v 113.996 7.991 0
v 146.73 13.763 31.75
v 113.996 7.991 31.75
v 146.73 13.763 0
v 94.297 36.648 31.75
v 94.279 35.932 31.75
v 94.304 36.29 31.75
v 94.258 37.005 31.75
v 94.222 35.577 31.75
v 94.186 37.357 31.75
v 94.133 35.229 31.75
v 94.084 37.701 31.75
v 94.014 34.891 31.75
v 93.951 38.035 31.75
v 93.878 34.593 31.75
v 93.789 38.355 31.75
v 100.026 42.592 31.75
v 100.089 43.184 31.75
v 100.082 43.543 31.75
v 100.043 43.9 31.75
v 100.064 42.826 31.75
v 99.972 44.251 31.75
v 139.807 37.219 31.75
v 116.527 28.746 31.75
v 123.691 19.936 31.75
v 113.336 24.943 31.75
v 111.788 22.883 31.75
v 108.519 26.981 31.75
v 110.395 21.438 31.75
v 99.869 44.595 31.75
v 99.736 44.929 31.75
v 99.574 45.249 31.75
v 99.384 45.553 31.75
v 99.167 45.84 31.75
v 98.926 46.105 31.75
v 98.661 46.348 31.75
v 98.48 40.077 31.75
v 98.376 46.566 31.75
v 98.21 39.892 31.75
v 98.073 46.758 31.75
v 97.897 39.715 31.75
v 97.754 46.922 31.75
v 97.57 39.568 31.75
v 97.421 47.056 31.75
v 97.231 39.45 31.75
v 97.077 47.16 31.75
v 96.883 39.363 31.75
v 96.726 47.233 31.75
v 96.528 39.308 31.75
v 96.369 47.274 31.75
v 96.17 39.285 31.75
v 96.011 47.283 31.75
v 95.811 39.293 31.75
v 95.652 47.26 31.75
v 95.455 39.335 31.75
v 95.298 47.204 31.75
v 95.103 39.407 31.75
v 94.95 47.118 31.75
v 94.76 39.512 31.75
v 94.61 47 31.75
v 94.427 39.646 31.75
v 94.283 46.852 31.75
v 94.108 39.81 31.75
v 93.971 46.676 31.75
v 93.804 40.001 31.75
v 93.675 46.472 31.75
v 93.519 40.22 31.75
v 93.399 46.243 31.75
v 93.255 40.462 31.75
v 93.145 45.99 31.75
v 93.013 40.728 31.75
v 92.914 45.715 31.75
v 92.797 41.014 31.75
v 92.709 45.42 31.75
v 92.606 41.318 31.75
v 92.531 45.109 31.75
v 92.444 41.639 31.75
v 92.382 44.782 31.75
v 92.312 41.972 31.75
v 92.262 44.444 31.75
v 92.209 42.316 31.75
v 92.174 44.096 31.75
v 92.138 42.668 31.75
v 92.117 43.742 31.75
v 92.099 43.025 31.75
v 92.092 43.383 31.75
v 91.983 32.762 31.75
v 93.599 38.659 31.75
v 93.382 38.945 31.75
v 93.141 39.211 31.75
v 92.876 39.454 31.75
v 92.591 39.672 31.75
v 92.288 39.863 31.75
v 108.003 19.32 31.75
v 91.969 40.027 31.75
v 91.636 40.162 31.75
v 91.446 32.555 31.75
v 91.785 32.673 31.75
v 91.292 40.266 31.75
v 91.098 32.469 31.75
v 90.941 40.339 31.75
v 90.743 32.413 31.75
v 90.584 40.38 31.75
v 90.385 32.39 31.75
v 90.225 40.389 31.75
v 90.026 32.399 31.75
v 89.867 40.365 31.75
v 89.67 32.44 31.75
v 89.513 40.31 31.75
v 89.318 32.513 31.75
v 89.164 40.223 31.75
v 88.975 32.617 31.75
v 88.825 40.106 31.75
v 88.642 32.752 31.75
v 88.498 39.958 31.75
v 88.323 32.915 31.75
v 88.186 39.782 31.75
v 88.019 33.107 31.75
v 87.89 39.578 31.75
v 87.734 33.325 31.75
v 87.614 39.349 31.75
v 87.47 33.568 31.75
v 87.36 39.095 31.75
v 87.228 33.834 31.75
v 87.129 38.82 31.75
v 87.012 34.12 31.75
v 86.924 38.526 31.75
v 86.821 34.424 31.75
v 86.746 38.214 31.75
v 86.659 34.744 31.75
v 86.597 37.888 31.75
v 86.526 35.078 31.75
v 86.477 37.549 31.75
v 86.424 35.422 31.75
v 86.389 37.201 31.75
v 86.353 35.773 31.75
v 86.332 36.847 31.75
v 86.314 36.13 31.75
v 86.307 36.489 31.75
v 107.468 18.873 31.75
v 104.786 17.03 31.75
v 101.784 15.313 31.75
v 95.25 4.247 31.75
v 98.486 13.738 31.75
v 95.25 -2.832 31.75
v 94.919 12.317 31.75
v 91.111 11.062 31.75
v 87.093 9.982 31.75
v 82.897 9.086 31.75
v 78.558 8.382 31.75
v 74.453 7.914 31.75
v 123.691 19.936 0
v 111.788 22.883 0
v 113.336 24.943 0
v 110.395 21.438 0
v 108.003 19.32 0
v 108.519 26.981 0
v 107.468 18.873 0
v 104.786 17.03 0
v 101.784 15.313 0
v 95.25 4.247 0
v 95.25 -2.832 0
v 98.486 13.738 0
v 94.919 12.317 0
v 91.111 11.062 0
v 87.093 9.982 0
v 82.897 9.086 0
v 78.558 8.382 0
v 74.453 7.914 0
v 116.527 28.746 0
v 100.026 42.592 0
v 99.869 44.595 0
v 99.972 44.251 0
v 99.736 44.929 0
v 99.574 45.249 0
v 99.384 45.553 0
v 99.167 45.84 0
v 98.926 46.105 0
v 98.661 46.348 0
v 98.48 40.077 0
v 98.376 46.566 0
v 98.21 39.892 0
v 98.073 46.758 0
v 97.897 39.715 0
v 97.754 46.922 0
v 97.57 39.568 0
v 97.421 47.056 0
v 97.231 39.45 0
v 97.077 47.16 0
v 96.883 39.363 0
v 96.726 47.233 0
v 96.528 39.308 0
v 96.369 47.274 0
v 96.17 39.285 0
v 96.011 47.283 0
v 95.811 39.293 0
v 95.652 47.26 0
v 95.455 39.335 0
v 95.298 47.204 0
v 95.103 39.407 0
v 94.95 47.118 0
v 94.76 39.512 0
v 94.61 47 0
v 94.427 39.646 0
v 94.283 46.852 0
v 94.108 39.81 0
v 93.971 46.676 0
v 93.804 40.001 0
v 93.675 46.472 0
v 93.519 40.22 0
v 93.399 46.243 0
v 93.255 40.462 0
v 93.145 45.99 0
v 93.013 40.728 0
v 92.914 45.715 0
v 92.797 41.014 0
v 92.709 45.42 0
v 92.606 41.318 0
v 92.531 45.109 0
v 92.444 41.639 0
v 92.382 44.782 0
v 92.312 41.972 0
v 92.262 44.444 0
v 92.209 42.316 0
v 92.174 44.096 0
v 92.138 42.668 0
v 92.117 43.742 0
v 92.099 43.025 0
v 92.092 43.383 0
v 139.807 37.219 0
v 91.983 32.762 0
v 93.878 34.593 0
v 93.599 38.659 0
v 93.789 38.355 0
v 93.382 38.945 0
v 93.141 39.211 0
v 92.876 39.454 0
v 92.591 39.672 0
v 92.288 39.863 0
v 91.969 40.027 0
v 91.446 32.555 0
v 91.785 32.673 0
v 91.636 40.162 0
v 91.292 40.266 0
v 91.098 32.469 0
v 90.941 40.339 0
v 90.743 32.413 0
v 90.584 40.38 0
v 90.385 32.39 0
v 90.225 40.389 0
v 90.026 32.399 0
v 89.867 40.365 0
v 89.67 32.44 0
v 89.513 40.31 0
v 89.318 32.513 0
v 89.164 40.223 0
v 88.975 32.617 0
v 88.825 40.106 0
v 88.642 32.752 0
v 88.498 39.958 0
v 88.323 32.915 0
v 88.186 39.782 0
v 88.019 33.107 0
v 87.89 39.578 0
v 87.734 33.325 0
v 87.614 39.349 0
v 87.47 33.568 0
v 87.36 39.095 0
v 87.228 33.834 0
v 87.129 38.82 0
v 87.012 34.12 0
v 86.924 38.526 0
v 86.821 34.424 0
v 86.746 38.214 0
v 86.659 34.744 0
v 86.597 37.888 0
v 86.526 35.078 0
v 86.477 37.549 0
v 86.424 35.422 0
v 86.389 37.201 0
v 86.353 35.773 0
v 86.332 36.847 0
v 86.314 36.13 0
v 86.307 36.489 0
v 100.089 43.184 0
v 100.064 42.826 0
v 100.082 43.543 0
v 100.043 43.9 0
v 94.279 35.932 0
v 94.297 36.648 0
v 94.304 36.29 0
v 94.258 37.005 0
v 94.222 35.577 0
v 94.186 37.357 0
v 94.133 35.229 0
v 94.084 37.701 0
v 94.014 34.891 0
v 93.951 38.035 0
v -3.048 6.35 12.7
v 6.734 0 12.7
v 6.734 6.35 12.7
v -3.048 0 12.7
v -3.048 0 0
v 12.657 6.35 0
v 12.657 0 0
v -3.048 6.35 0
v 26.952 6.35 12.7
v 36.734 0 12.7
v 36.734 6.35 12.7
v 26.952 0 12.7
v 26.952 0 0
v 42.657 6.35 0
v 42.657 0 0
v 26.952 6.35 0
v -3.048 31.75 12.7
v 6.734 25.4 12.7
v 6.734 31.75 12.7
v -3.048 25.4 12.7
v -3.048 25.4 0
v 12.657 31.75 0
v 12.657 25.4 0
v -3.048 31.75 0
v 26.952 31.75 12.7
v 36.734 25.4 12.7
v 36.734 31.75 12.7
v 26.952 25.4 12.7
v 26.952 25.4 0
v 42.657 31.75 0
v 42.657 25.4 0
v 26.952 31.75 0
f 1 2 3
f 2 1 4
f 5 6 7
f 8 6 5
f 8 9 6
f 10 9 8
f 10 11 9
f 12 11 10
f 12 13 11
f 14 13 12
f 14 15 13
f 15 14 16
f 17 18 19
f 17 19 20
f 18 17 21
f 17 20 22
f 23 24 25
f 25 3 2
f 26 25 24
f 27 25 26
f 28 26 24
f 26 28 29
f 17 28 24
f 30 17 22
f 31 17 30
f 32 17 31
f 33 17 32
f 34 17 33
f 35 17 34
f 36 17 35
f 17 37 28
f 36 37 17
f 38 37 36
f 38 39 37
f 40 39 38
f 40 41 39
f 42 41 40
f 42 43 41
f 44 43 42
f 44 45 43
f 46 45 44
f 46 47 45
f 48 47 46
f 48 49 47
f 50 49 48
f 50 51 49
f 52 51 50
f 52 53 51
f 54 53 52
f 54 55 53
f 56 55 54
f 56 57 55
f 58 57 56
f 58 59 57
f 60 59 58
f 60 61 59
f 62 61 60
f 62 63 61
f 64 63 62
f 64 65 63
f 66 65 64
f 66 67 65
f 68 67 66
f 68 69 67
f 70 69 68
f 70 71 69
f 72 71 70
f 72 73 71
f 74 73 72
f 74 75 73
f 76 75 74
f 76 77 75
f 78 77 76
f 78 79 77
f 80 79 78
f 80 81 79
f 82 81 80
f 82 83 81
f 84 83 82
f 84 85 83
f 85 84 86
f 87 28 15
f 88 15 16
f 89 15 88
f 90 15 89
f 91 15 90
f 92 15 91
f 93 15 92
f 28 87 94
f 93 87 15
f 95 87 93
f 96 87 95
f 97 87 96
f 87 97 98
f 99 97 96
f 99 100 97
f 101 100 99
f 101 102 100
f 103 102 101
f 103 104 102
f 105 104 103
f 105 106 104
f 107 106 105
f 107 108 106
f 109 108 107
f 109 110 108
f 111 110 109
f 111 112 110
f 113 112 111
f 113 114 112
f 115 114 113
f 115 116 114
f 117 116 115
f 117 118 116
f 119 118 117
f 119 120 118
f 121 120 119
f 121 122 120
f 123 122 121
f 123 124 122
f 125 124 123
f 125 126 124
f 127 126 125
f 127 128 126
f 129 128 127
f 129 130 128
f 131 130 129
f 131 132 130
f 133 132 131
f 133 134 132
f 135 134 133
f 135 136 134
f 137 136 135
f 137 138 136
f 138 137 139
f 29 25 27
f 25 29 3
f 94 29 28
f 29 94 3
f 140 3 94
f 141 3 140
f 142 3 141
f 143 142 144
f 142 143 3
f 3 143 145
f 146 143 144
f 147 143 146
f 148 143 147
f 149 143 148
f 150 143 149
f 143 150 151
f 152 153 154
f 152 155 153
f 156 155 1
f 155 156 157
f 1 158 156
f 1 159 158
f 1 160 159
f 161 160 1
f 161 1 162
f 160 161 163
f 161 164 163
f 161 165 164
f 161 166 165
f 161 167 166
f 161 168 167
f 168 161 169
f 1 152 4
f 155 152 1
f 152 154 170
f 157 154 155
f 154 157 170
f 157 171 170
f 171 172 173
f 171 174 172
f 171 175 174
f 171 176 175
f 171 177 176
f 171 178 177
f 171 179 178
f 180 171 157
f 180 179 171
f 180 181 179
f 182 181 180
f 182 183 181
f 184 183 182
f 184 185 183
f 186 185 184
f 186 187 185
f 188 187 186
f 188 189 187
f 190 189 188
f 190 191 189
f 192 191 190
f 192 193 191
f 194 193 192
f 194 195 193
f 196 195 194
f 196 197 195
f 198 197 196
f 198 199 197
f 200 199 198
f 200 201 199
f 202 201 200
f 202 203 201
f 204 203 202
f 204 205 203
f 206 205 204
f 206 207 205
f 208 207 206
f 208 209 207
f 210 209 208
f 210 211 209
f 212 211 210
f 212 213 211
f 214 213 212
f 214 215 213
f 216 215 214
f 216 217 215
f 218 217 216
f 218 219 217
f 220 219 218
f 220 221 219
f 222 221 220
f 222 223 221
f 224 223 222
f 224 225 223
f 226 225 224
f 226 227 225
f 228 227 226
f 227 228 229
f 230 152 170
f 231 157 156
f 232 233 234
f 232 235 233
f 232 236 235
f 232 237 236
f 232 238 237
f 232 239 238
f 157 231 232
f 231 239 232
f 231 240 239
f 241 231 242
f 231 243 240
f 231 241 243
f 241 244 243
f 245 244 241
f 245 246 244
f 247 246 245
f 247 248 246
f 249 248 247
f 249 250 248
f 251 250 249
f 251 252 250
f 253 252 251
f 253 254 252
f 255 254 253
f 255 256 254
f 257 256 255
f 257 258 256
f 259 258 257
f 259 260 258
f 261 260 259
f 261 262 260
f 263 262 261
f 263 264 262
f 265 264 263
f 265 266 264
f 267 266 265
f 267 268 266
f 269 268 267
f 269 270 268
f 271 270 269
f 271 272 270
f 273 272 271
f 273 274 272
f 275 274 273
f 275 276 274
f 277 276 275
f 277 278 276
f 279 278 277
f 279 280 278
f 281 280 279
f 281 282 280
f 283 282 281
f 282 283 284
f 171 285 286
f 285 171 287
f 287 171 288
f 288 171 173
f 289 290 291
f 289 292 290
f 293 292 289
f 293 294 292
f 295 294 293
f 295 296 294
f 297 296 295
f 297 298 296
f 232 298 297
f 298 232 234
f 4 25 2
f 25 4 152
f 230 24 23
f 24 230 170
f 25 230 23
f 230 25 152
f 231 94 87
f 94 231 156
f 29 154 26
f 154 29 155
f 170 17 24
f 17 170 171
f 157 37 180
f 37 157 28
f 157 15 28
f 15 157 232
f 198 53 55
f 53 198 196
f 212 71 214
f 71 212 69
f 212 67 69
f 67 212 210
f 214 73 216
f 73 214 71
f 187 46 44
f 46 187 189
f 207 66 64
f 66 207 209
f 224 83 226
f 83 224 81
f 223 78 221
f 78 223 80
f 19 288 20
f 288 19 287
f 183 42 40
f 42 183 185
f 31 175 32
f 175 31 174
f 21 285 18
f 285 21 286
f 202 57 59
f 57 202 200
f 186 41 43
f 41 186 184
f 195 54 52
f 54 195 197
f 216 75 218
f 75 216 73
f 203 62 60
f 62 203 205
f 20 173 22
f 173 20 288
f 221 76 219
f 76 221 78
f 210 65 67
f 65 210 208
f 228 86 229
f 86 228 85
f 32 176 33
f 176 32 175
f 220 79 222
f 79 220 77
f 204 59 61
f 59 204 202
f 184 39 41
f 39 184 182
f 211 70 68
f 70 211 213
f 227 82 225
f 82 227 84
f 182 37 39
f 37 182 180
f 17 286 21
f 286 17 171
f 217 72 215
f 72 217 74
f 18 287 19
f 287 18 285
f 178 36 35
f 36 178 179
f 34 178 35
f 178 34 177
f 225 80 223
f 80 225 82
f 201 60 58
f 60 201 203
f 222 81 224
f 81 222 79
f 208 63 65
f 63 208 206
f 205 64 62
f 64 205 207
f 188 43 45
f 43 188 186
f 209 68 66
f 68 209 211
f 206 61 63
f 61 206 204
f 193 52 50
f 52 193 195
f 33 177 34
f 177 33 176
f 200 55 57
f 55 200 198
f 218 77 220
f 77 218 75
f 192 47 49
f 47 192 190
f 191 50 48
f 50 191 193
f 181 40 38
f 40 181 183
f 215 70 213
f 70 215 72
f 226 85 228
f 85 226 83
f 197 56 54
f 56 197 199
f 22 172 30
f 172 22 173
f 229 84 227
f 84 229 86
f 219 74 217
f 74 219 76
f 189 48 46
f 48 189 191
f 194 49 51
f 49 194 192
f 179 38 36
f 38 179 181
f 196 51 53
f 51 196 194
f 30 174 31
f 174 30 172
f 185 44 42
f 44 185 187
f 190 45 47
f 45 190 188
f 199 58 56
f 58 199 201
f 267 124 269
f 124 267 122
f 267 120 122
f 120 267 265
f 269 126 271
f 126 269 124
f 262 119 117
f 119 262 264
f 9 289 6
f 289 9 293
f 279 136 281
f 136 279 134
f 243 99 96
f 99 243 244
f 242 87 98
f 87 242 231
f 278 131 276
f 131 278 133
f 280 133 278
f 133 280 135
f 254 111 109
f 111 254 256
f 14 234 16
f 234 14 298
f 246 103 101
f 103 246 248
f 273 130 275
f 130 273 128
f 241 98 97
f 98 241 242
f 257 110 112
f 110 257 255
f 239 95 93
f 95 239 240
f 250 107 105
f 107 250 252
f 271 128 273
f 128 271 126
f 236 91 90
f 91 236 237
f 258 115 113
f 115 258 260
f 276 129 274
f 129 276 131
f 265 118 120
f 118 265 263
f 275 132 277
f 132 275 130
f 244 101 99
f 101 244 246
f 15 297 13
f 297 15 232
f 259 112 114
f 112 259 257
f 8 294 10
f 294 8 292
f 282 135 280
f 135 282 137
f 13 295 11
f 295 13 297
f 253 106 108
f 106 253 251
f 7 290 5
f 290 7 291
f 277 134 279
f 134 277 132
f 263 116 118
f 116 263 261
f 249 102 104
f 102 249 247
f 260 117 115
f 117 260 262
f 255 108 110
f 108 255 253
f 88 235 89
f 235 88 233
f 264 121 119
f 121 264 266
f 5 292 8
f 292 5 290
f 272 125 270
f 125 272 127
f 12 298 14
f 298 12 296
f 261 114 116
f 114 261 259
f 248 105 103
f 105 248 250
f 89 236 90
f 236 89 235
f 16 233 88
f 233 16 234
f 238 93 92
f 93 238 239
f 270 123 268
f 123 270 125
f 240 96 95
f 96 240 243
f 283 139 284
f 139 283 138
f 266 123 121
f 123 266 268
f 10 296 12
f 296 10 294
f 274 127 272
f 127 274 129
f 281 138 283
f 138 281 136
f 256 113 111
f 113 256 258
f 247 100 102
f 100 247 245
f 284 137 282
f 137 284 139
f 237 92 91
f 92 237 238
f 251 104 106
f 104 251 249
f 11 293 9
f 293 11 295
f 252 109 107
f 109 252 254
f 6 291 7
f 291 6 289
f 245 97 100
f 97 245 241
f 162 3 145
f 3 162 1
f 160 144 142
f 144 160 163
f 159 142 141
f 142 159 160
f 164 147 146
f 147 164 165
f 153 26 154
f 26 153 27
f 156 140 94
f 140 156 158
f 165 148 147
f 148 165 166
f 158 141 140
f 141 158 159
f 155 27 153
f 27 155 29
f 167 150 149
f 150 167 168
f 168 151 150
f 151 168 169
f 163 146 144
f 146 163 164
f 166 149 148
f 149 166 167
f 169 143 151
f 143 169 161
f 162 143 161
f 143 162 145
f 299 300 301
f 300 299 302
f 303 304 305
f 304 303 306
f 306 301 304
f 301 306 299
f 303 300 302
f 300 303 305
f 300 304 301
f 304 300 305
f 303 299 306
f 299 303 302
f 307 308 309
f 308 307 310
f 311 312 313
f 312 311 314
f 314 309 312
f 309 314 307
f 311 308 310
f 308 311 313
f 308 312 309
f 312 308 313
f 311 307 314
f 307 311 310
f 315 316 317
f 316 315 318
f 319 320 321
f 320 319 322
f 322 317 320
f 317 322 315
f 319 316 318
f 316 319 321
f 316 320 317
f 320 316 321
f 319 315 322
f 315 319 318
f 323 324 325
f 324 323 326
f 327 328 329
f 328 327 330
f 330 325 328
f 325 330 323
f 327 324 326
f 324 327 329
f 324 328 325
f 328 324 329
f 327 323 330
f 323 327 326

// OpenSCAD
$fn=70;
con=25.4;
wall=.125;
legs=.5;
x=93;
y=25.4;

module body(){
	translate([0,0,legs]*con){
		difference(){
			union(){
				translate([-wall,0,0]*con){
					cube([3+wall*2,1+wall*2,3+wall*2]*con);
				}
				translate([-wall,.5+wall,0]*con){
					cylinder(r=(1+wall*2)/2*con,h=(3+wall*2)*con);
				}
			}
			translate([-wall,.5+wall,wall]*con){
				cylinder(r=((1+wall*2)/2-wall)*con,h=4*con);
			}
			translate([0,wall,wall]*con){
				cube([3,1,4]*con);
			}
		}
		translate([0,0,0]*con){
			cube([wall,((1+wall*2)/2)*2,(3+wall*2)]*con);
		}
	}
	difference(){
		translate([3,0,0]*con){
			rotate([0,-10,0]){
				cube([1,1+wall*2,(4)]*con);
			}
		}
		translate([0,-1,wall]*con){
			cube([3,4,4]*con);
		}
		translate([0,-1,0]*con){
			cube([5,3,legs]*con);
		}
		translate([0,-1,legs+3+wall*2]*con){
			cube([5,3,3]*con);
		}
	}
}

module leg(){
	translate([-.12,0,0]*con){
		cube([.12,wall*2,legs]*con);
	}
	intersection(){
		translate([0,0,0]*con){
			cube([legs,wall*2,legs]*con);
		}
		translate([1.6,0,-6.34]){
			rotate([0,-25,0]){
				cube([legs,wall*2,legs*4]*con);
			}
		}
	}
}

module legs(x,y){
	translate([0,0,0]*con){
		leg();
	}
	translate([x,0,0]){
		leg();
	}
	translate([0,y,0]){
		leg();
	}
	translate([x,y,0]){
		leg();
	}
}

module head(){
	translate([90,0,120]){
		rotate([0,10,0]){
			intersection(){
				translate([0,0,0]*con){
					cube([.5,wall*2+1,.5*4]*con);
				}
				translate([1.6,0,-6.34]){
					rotate([0,-25,0]){
						cube([.5,wall*2+1,.5*4]*con);
					}
				}
			}
			translate([20,0,0]){
				rotate([0,10,0]){
					mirror(){
						intersection(){
							translate([0,0,-1]){
								cube([.5,wall*2+1,.5*4]*con);
							}
							translate([1.6,0,-6.34]){
								rotate([0,-27,0]){
									cube([.5,wall*2+1,.5*4]*con);
								}
							}
						}
					}
				}
			}
			translate([20,0,0]){
				rotate([0,130,0]){
						difference(){
							cube([.5,wall*2+1,.5*2]*con);
							translate([6.5,100,30]){
								rotate([90,180,0]){
									linear_extrude(height=200){
										polygon(
											points=[[0,25],[-10,-20],[10,-20]],
											paths=[[0,1,2]]
										);
									}
								}
							}
						}
					translate([2,(wall+.5)*con,25]){
						rotate([90,0,0]){
							cylinder(r=4,h=(wall*2+1)*con,center=true);
						}
					}
					translate([11,(wall+.5)*con,25]){
						rotate([90,0,0]){
							cylinder(r=4,h=(wall*2+1)*con,center=true);
						}
					}
				}
			}
			difference(){
				union(){
					translate([0,0,-48]){
						cube([.78,(wall*2+1),2]*con);
					}
					translate([-8.7,0,-30]){
						rotate([0,20,0]){
							cube([.5,(wall*2+1),1.2]*con);
						}
					}
				}
				translate([33,0,-50]){
					rotate([90,-10,0]){
						resize([2*con,4*con,4*con]){
							cylinder(r=25.4,h=(3)*con,center=true);
						}
					}
				}
			}
		}
	}
}
module modified(){
	difference(){
		translate([.75,0,0]*con){
			head();
		}
		translate([.75,0,0]*con){
			body();
		}
		
	}
}


translate([0,-100,0]){
	rotate([90,0,90]){
		modified();
	}
}

legs(30,y);
